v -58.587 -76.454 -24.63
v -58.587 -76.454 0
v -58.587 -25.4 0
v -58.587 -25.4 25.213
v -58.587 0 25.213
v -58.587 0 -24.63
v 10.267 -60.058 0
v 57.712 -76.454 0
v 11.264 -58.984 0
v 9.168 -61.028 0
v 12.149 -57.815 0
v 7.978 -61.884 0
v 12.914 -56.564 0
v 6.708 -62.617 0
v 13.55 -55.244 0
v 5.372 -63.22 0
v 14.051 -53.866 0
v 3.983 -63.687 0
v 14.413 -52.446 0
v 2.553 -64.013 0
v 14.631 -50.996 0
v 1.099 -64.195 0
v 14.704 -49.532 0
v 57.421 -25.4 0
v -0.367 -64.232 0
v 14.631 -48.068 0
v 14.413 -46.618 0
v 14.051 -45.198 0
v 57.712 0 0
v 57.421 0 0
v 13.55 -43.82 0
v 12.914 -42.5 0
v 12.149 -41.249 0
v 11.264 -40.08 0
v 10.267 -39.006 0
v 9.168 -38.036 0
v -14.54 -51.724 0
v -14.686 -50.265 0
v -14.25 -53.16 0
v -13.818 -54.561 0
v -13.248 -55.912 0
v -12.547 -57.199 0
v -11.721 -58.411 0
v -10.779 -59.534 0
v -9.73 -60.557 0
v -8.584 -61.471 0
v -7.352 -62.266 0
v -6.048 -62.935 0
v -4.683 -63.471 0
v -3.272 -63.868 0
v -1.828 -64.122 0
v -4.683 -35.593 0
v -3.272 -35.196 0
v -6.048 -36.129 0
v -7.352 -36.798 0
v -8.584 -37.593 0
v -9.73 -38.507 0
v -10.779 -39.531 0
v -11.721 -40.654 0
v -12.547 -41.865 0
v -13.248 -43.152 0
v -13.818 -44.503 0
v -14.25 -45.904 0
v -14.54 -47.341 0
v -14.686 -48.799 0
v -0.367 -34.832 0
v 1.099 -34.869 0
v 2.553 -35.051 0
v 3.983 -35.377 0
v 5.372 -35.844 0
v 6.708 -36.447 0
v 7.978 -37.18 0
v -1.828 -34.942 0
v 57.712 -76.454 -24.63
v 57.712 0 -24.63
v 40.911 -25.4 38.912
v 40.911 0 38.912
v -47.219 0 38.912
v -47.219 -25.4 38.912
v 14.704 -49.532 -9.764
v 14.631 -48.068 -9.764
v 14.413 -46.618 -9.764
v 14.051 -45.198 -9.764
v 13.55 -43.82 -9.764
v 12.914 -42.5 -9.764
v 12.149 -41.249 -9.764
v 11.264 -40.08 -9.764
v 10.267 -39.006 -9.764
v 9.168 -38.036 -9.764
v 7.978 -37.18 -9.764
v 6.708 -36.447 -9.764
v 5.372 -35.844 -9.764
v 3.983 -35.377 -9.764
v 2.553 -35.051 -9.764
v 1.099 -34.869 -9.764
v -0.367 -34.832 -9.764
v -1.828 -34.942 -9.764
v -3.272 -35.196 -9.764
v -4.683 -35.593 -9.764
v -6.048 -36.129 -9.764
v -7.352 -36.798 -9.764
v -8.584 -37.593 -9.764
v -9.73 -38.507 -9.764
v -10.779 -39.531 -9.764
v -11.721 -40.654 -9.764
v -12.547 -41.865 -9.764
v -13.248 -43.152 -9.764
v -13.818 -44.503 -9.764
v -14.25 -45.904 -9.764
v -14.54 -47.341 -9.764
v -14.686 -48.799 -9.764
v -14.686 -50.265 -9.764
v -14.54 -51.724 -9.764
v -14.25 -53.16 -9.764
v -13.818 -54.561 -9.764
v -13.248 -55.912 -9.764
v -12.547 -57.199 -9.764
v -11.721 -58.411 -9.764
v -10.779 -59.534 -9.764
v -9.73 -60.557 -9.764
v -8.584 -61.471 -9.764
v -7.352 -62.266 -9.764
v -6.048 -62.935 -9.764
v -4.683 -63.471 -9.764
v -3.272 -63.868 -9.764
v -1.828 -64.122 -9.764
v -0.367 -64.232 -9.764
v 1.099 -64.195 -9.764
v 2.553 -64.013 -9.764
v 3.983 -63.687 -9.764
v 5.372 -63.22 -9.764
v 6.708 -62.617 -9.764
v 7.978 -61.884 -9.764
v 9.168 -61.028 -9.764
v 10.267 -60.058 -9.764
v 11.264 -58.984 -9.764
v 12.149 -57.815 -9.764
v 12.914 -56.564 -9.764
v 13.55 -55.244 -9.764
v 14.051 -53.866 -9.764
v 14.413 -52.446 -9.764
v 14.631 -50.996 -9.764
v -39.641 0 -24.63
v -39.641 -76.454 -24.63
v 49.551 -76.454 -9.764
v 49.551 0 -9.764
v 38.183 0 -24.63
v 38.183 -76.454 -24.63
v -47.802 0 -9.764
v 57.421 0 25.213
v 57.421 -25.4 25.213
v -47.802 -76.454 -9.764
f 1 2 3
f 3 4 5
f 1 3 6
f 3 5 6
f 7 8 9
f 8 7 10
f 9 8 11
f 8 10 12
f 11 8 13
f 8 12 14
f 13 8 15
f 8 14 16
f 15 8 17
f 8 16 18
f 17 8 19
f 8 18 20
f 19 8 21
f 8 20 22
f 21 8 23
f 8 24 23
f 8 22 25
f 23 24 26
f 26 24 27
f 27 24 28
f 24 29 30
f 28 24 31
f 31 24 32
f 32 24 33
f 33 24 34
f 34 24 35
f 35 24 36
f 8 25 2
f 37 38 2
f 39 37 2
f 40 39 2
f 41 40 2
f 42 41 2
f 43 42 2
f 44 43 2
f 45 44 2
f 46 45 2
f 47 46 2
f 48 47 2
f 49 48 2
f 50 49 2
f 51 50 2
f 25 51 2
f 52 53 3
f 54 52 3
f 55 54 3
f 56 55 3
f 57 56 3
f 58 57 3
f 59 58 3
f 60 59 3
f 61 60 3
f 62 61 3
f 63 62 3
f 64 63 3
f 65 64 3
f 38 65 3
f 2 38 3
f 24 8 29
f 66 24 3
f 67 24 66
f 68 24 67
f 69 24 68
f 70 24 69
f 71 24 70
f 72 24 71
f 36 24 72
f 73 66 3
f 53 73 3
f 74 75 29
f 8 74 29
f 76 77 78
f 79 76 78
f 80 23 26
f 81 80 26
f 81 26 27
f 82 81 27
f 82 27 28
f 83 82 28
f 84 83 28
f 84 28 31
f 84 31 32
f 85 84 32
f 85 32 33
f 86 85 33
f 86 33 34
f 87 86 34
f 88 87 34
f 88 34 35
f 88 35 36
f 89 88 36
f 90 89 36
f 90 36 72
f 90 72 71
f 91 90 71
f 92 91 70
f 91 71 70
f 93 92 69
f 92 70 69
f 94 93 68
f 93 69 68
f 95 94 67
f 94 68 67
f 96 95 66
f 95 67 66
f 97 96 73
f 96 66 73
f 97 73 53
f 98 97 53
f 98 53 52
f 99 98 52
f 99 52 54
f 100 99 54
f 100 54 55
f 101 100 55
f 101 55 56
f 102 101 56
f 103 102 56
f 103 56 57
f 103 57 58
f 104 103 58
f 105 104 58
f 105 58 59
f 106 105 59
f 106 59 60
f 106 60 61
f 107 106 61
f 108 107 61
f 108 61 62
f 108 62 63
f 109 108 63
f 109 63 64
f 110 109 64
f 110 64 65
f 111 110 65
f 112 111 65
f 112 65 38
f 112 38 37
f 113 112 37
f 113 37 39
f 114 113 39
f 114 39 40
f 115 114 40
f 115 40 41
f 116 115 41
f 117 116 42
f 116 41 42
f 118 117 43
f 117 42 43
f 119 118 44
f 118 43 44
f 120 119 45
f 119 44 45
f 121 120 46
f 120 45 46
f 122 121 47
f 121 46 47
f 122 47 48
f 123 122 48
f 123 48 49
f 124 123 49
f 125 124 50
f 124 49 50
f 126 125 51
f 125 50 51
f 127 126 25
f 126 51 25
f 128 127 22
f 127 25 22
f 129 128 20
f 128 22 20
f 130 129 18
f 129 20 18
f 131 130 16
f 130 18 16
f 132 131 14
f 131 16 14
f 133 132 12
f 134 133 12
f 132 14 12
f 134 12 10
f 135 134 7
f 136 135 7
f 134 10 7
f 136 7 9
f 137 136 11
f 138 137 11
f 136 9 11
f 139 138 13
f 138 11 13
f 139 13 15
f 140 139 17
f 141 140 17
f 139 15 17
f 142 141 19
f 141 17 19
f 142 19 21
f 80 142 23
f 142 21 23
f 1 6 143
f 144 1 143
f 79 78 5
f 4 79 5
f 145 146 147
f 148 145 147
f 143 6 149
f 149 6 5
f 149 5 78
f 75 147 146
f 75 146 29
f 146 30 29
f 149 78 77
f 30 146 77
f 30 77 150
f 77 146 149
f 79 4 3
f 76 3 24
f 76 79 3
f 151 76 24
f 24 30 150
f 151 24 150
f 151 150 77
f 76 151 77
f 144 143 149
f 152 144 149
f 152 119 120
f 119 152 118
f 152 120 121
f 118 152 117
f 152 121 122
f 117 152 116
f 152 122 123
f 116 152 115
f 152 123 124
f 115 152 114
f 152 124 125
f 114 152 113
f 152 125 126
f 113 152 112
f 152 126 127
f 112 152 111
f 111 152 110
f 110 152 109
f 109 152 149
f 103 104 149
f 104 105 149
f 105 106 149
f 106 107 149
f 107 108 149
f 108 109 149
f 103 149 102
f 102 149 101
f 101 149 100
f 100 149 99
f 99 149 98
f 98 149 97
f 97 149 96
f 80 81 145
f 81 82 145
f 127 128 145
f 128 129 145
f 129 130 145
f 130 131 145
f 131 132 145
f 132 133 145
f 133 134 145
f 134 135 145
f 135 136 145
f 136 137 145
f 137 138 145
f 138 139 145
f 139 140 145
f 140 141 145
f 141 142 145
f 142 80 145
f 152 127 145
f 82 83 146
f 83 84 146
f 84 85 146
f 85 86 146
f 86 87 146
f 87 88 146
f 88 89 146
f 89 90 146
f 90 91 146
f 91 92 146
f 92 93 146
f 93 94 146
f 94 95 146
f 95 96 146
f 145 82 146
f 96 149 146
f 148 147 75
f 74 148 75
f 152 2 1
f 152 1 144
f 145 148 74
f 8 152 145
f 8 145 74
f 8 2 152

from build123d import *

# Parameters (mm, degrees)
F1_DEPTH = 76.454
F3_DEPTH = 25.4
F4_R     = 14.704348
F5_DEPTH = 25.4


with BuildPart() as f1:
    # F0 (on Front) → F1 (new body)
    with BuildSketch(Plane.XZ):
        Polygon((57.71213, 0), (-58.586556, 0), (-58.586556, -24.629673), (-39.640658, -24.629673), (-47.801968, -9.764426), (49.55082, -9.764426), (38.183279, -24.629673), (57.71213, -24.629673), align=None)
    extrude(amount=F1_DEPTH)

    # F2 (on Front) → F3 (join)
    with BuildSketch(Plane.XZ):
        Polygon((-58.586556, 25.212623), (-58.586556, 0), (57.420652, 0), (57.420652, 25.212623), (40.911183, 38.911968), (-47.219016, 38.911968), align=None)
    extrude(amount=F3_DEPTH)

    # F4 (on Top) → F5 (cut)
    with BuildSketch(Plane.XY):
        with Locations((0, -49.532082)):
            Circle(F4_R)
    extrude(amount=-F5_DEPTH, mode=Mode.SUBTRACT)


solid = f1.part
